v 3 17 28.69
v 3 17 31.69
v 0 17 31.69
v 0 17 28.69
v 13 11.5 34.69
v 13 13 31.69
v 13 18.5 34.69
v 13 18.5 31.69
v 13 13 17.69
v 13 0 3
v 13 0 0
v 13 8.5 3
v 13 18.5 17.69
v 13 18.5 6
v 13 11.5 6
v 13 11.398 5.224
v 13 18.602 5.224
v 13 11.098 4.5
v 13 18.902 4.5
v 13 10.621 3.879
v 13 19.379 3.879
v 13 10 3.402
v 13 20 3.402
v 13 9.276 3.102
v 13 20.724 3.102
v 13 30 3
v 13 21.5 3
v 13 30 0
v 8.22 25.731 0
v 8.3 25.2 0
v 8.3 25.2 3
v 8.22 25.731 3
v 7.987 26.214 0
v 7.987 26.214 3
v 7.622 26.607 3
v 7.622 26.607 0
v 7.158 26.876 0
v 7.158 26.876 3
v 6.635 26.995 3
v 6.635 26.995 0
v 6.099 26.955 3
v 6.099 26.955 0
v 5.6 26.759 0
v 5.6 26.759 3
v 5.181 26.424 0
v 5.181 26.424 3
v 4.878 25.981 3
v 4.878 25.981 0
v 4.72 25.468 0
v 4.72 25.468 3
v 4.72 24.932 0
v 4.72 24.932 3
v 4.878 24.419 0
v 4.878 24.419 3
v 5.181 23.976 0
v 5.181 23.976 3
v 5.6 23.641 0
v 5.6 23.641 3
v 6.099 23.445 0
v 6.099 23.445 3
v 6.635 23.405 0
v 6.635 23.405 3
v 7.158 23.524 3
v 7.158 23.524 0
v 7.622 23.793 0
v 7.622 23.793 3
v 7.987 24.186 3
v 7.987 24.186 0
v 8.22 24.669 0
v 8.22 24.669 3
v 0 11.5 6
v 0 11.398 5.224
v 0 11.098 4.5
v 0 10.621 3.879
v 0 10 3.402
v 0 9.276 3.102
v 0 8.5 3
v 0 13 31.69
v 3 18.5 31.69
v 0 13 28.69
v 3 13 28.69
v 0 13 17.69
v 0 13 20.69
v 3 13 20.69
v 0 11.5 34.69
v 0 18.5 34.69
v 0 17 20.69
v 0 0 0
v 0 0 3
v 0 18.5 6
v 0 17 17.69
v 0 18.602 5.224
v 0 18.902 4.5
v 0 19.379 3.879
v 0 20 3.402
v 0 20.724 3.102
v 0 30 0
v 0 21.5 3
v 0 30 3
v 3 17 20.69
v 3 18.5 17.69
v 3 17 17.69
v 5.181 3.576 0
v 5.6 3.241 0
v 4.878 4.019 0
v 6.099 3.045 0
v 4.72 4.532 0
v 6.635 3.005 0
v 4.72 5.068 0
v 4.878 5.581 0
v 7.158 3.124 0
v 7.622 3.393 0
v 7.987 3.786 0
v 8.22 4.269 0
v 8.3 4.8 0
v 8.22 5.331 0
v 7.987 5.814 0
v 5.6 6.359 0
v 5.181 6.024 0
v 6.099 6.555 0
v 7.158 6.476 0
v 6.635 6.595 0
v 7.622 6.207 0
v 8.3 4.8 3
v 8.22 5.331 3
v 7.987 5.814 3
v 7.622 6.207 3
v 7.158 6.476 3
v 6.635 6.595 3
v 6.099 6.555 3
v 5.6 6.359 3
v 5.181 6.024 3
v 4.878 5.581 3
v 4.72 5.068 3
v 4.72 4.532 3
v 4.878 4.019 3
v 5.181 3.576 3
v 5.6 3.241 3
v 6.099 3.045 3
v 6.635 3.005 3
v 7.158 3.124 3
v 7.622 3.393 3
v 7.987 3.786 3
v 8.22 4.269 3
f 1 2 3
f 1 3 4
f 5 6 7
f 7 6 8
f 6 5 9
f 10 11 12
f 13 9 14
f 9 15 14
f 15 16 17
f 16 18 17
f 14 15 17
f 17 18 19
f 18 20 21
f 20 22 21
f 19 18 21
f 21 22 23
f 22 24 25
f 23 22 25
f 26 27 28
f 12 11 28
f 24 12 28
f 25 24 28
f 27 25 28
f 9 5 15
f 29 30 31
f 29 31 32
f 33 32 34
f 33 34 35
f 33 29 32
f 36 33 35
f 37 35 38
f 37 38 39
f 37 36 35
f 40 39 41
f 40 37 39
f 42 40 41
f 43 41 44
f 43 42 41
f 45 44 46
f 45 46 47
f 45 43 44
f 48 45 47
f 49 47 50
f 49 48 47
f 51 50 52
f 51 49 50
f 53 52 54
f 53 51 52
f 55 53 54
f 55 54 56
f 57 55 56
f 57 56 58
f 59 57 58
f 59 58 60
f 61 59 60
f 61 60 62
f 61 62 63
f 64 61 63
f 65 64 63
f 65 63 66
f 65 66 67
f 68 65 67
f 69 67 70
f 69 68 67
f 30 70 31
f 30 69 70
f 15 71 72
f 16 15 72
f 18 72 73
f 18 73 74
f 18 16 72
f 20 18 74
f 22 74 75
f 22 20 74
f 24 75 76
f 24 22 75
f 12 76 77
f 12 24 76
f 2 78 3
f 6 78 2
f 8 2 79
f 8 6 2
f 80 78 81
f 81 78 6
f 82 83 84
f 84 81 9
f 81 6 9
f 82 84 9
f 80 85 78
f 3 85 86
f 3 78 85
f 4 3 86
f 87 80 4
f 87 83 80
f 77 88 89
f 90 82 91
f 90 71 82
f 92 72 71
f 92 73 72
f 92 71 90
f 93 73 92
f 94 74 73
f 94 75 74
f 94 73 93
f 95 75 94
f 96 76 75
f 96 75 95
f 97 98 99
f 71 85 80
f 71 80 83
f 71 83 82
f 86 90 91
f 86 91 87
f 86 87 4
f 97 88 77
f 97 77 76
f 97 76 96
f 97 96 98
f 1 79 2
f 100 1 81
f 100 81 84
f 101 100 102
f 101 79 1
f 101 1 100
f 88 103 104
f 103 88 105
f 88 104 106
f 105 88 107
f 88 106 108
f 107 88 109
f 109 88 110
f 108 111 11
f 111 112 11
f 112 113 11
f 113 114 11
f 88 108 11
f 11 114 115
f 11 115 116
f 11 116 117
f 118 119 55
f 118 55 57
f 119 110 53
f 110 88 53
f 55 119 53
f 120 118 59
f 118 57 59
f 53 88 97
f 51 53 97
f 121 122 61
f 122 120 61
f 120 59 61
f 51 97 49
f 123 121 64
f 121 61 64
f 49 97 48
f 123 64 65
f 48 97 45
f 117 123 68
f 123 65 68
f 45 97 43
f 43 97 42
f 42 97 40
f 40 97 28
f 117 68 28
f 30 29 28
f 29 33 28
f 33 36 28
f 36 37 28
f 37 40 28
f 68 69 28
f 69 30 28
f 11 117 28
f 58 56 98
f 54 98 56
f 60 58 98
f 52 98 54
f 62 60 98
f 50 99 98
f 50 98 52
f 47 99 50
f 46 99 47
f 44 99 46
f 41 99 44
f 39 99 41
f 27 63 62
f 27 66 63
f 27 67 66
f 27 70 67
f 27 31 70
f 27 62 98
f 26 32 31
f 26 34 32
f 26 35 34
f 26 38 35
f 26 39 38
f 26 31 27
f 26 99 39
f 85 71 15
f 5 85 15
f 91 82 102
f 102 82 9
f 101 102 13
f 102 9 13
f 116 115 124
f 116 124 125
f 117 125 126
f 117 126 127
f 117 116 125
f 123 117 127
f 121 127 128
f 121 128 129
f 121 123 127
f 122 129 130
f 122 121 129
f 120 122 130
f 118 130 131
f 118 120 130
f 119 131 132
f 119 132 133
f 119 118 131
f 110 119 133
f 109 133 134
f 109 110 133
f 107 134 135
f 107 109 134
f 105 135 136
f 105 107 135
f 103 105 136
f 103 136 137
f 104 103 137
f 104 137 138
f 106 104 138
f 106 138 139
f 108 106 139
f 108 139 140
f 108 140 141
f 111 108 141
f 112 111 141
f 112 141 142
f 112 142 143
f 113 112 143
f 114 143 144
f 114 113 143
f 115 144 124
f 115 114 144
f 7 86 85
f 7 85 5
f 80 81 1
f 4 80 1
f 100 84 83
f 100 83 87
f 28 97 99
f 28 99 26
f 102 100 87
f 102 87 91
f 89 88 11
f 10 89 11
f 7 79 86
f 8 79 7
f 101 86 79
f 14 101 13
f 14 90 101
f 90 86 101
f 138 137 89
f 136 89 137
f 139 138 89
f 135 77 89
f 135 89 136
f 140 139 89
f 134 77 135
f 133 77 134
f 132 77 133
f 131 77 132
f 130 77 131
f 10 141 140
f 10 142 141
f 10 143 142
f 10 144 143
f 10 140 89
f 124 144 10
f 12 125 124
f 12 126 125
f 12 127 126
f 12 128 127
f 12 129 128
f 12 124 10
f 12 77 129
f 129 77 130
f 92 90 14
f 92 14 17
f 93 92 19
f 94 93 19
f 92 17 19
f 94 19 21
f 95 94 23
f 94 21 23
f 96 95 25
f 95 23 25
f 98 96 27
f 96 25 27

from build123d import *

# Parameters (mm, degrees)
SKETCH1_W           = 13
SKETCH1_H           = 30
SKETCH1_R           = 1.8
BOSS_EXTRUDE1_DEPTH = 3
SKETCH2_W           = 13
SKETCH2_H           = 7
BOSS_EXTRUDE2_DEPTH = 31.69
SKETCH3_W           = 10
SKETCH3_H           = 14
CUT_EXTRUDE1_DEPTH  = 5.5
SKETCH4_W           = 3
SKETCH4_H           = 4
CUT_EXTRUDE2_DEPTH  = 47.940346185
FILLET1_R           = 3


with BuildPart() as part:
    # Sketch1 → Boss-Extrude1 (new body)
    with BuildSketch(Plane.XY):
        with Locations((6.5, 15)):
            Rectangle(SKETCH1_W, SKETCH1_H)
        with Locations((6.5, 25.2)):
            Circle(SKETCH1_R, mode=Mode.SUBTRACT)
        with Locations((6.5, 4.8)):
            Circle(SKETCH1_R, mode=Mode.SUBTRACT)
    extrude(amount=BOSS_EXTRUDE1_DEPTH)

    # Sketch2 → Boss-Extrude2 (add)
    with BuildSketch(Plane.XY.offset(3)):
        with Locations((6.5, 15)):
            Rectangle(SKETCH2_W, SKETCH2_H)
    extrude(amount=BOSS_EXTRUDE2_DEPTH)

    # Sketch3 → Cut-Extrude1 (cut)
    with BuildSketch(Plane(origin=(0, 18.5, 0), x_dir=(1, 0, 0), z_dir=(0, 1, 0))):
        with Locations((8, -24.69)):
            Rectangle(SKETCH3_W, SKETCH3_H)
    extrude(amount=-CUT_EXTRUDE1_DEPTH, mode=Mode.SUBTRACT)

    # Sketch4 → Cut-Extrude2 (cut, through all)
    with BuildSketch(Plane(origin=(3, 0, 0), x_dir=(0, 0, -1), z_dir=(1, 0, 0))):
        with Locations((-30.19, 15)):
            Rectangle(SKETCH4_W, SKETCH4_H)
        with Locations((-19.19, 15)):
            Rectangle(SKETCH4_W, SKETCH4_H)
    extrude(amount=-CUT_EXTRUDE2_DEPTH, mode=Mode.SUBTRACT)

    # Fillet1
    fillet1_edges = [part.edges().sort_by_distance(p)[0] for p in [
        (6.5, 11.5, 3),
        (6.5, 18.5, 3),
    ]]
    fillet(fillet1_edges, radius=FILLET1_R)


solid = part.part
